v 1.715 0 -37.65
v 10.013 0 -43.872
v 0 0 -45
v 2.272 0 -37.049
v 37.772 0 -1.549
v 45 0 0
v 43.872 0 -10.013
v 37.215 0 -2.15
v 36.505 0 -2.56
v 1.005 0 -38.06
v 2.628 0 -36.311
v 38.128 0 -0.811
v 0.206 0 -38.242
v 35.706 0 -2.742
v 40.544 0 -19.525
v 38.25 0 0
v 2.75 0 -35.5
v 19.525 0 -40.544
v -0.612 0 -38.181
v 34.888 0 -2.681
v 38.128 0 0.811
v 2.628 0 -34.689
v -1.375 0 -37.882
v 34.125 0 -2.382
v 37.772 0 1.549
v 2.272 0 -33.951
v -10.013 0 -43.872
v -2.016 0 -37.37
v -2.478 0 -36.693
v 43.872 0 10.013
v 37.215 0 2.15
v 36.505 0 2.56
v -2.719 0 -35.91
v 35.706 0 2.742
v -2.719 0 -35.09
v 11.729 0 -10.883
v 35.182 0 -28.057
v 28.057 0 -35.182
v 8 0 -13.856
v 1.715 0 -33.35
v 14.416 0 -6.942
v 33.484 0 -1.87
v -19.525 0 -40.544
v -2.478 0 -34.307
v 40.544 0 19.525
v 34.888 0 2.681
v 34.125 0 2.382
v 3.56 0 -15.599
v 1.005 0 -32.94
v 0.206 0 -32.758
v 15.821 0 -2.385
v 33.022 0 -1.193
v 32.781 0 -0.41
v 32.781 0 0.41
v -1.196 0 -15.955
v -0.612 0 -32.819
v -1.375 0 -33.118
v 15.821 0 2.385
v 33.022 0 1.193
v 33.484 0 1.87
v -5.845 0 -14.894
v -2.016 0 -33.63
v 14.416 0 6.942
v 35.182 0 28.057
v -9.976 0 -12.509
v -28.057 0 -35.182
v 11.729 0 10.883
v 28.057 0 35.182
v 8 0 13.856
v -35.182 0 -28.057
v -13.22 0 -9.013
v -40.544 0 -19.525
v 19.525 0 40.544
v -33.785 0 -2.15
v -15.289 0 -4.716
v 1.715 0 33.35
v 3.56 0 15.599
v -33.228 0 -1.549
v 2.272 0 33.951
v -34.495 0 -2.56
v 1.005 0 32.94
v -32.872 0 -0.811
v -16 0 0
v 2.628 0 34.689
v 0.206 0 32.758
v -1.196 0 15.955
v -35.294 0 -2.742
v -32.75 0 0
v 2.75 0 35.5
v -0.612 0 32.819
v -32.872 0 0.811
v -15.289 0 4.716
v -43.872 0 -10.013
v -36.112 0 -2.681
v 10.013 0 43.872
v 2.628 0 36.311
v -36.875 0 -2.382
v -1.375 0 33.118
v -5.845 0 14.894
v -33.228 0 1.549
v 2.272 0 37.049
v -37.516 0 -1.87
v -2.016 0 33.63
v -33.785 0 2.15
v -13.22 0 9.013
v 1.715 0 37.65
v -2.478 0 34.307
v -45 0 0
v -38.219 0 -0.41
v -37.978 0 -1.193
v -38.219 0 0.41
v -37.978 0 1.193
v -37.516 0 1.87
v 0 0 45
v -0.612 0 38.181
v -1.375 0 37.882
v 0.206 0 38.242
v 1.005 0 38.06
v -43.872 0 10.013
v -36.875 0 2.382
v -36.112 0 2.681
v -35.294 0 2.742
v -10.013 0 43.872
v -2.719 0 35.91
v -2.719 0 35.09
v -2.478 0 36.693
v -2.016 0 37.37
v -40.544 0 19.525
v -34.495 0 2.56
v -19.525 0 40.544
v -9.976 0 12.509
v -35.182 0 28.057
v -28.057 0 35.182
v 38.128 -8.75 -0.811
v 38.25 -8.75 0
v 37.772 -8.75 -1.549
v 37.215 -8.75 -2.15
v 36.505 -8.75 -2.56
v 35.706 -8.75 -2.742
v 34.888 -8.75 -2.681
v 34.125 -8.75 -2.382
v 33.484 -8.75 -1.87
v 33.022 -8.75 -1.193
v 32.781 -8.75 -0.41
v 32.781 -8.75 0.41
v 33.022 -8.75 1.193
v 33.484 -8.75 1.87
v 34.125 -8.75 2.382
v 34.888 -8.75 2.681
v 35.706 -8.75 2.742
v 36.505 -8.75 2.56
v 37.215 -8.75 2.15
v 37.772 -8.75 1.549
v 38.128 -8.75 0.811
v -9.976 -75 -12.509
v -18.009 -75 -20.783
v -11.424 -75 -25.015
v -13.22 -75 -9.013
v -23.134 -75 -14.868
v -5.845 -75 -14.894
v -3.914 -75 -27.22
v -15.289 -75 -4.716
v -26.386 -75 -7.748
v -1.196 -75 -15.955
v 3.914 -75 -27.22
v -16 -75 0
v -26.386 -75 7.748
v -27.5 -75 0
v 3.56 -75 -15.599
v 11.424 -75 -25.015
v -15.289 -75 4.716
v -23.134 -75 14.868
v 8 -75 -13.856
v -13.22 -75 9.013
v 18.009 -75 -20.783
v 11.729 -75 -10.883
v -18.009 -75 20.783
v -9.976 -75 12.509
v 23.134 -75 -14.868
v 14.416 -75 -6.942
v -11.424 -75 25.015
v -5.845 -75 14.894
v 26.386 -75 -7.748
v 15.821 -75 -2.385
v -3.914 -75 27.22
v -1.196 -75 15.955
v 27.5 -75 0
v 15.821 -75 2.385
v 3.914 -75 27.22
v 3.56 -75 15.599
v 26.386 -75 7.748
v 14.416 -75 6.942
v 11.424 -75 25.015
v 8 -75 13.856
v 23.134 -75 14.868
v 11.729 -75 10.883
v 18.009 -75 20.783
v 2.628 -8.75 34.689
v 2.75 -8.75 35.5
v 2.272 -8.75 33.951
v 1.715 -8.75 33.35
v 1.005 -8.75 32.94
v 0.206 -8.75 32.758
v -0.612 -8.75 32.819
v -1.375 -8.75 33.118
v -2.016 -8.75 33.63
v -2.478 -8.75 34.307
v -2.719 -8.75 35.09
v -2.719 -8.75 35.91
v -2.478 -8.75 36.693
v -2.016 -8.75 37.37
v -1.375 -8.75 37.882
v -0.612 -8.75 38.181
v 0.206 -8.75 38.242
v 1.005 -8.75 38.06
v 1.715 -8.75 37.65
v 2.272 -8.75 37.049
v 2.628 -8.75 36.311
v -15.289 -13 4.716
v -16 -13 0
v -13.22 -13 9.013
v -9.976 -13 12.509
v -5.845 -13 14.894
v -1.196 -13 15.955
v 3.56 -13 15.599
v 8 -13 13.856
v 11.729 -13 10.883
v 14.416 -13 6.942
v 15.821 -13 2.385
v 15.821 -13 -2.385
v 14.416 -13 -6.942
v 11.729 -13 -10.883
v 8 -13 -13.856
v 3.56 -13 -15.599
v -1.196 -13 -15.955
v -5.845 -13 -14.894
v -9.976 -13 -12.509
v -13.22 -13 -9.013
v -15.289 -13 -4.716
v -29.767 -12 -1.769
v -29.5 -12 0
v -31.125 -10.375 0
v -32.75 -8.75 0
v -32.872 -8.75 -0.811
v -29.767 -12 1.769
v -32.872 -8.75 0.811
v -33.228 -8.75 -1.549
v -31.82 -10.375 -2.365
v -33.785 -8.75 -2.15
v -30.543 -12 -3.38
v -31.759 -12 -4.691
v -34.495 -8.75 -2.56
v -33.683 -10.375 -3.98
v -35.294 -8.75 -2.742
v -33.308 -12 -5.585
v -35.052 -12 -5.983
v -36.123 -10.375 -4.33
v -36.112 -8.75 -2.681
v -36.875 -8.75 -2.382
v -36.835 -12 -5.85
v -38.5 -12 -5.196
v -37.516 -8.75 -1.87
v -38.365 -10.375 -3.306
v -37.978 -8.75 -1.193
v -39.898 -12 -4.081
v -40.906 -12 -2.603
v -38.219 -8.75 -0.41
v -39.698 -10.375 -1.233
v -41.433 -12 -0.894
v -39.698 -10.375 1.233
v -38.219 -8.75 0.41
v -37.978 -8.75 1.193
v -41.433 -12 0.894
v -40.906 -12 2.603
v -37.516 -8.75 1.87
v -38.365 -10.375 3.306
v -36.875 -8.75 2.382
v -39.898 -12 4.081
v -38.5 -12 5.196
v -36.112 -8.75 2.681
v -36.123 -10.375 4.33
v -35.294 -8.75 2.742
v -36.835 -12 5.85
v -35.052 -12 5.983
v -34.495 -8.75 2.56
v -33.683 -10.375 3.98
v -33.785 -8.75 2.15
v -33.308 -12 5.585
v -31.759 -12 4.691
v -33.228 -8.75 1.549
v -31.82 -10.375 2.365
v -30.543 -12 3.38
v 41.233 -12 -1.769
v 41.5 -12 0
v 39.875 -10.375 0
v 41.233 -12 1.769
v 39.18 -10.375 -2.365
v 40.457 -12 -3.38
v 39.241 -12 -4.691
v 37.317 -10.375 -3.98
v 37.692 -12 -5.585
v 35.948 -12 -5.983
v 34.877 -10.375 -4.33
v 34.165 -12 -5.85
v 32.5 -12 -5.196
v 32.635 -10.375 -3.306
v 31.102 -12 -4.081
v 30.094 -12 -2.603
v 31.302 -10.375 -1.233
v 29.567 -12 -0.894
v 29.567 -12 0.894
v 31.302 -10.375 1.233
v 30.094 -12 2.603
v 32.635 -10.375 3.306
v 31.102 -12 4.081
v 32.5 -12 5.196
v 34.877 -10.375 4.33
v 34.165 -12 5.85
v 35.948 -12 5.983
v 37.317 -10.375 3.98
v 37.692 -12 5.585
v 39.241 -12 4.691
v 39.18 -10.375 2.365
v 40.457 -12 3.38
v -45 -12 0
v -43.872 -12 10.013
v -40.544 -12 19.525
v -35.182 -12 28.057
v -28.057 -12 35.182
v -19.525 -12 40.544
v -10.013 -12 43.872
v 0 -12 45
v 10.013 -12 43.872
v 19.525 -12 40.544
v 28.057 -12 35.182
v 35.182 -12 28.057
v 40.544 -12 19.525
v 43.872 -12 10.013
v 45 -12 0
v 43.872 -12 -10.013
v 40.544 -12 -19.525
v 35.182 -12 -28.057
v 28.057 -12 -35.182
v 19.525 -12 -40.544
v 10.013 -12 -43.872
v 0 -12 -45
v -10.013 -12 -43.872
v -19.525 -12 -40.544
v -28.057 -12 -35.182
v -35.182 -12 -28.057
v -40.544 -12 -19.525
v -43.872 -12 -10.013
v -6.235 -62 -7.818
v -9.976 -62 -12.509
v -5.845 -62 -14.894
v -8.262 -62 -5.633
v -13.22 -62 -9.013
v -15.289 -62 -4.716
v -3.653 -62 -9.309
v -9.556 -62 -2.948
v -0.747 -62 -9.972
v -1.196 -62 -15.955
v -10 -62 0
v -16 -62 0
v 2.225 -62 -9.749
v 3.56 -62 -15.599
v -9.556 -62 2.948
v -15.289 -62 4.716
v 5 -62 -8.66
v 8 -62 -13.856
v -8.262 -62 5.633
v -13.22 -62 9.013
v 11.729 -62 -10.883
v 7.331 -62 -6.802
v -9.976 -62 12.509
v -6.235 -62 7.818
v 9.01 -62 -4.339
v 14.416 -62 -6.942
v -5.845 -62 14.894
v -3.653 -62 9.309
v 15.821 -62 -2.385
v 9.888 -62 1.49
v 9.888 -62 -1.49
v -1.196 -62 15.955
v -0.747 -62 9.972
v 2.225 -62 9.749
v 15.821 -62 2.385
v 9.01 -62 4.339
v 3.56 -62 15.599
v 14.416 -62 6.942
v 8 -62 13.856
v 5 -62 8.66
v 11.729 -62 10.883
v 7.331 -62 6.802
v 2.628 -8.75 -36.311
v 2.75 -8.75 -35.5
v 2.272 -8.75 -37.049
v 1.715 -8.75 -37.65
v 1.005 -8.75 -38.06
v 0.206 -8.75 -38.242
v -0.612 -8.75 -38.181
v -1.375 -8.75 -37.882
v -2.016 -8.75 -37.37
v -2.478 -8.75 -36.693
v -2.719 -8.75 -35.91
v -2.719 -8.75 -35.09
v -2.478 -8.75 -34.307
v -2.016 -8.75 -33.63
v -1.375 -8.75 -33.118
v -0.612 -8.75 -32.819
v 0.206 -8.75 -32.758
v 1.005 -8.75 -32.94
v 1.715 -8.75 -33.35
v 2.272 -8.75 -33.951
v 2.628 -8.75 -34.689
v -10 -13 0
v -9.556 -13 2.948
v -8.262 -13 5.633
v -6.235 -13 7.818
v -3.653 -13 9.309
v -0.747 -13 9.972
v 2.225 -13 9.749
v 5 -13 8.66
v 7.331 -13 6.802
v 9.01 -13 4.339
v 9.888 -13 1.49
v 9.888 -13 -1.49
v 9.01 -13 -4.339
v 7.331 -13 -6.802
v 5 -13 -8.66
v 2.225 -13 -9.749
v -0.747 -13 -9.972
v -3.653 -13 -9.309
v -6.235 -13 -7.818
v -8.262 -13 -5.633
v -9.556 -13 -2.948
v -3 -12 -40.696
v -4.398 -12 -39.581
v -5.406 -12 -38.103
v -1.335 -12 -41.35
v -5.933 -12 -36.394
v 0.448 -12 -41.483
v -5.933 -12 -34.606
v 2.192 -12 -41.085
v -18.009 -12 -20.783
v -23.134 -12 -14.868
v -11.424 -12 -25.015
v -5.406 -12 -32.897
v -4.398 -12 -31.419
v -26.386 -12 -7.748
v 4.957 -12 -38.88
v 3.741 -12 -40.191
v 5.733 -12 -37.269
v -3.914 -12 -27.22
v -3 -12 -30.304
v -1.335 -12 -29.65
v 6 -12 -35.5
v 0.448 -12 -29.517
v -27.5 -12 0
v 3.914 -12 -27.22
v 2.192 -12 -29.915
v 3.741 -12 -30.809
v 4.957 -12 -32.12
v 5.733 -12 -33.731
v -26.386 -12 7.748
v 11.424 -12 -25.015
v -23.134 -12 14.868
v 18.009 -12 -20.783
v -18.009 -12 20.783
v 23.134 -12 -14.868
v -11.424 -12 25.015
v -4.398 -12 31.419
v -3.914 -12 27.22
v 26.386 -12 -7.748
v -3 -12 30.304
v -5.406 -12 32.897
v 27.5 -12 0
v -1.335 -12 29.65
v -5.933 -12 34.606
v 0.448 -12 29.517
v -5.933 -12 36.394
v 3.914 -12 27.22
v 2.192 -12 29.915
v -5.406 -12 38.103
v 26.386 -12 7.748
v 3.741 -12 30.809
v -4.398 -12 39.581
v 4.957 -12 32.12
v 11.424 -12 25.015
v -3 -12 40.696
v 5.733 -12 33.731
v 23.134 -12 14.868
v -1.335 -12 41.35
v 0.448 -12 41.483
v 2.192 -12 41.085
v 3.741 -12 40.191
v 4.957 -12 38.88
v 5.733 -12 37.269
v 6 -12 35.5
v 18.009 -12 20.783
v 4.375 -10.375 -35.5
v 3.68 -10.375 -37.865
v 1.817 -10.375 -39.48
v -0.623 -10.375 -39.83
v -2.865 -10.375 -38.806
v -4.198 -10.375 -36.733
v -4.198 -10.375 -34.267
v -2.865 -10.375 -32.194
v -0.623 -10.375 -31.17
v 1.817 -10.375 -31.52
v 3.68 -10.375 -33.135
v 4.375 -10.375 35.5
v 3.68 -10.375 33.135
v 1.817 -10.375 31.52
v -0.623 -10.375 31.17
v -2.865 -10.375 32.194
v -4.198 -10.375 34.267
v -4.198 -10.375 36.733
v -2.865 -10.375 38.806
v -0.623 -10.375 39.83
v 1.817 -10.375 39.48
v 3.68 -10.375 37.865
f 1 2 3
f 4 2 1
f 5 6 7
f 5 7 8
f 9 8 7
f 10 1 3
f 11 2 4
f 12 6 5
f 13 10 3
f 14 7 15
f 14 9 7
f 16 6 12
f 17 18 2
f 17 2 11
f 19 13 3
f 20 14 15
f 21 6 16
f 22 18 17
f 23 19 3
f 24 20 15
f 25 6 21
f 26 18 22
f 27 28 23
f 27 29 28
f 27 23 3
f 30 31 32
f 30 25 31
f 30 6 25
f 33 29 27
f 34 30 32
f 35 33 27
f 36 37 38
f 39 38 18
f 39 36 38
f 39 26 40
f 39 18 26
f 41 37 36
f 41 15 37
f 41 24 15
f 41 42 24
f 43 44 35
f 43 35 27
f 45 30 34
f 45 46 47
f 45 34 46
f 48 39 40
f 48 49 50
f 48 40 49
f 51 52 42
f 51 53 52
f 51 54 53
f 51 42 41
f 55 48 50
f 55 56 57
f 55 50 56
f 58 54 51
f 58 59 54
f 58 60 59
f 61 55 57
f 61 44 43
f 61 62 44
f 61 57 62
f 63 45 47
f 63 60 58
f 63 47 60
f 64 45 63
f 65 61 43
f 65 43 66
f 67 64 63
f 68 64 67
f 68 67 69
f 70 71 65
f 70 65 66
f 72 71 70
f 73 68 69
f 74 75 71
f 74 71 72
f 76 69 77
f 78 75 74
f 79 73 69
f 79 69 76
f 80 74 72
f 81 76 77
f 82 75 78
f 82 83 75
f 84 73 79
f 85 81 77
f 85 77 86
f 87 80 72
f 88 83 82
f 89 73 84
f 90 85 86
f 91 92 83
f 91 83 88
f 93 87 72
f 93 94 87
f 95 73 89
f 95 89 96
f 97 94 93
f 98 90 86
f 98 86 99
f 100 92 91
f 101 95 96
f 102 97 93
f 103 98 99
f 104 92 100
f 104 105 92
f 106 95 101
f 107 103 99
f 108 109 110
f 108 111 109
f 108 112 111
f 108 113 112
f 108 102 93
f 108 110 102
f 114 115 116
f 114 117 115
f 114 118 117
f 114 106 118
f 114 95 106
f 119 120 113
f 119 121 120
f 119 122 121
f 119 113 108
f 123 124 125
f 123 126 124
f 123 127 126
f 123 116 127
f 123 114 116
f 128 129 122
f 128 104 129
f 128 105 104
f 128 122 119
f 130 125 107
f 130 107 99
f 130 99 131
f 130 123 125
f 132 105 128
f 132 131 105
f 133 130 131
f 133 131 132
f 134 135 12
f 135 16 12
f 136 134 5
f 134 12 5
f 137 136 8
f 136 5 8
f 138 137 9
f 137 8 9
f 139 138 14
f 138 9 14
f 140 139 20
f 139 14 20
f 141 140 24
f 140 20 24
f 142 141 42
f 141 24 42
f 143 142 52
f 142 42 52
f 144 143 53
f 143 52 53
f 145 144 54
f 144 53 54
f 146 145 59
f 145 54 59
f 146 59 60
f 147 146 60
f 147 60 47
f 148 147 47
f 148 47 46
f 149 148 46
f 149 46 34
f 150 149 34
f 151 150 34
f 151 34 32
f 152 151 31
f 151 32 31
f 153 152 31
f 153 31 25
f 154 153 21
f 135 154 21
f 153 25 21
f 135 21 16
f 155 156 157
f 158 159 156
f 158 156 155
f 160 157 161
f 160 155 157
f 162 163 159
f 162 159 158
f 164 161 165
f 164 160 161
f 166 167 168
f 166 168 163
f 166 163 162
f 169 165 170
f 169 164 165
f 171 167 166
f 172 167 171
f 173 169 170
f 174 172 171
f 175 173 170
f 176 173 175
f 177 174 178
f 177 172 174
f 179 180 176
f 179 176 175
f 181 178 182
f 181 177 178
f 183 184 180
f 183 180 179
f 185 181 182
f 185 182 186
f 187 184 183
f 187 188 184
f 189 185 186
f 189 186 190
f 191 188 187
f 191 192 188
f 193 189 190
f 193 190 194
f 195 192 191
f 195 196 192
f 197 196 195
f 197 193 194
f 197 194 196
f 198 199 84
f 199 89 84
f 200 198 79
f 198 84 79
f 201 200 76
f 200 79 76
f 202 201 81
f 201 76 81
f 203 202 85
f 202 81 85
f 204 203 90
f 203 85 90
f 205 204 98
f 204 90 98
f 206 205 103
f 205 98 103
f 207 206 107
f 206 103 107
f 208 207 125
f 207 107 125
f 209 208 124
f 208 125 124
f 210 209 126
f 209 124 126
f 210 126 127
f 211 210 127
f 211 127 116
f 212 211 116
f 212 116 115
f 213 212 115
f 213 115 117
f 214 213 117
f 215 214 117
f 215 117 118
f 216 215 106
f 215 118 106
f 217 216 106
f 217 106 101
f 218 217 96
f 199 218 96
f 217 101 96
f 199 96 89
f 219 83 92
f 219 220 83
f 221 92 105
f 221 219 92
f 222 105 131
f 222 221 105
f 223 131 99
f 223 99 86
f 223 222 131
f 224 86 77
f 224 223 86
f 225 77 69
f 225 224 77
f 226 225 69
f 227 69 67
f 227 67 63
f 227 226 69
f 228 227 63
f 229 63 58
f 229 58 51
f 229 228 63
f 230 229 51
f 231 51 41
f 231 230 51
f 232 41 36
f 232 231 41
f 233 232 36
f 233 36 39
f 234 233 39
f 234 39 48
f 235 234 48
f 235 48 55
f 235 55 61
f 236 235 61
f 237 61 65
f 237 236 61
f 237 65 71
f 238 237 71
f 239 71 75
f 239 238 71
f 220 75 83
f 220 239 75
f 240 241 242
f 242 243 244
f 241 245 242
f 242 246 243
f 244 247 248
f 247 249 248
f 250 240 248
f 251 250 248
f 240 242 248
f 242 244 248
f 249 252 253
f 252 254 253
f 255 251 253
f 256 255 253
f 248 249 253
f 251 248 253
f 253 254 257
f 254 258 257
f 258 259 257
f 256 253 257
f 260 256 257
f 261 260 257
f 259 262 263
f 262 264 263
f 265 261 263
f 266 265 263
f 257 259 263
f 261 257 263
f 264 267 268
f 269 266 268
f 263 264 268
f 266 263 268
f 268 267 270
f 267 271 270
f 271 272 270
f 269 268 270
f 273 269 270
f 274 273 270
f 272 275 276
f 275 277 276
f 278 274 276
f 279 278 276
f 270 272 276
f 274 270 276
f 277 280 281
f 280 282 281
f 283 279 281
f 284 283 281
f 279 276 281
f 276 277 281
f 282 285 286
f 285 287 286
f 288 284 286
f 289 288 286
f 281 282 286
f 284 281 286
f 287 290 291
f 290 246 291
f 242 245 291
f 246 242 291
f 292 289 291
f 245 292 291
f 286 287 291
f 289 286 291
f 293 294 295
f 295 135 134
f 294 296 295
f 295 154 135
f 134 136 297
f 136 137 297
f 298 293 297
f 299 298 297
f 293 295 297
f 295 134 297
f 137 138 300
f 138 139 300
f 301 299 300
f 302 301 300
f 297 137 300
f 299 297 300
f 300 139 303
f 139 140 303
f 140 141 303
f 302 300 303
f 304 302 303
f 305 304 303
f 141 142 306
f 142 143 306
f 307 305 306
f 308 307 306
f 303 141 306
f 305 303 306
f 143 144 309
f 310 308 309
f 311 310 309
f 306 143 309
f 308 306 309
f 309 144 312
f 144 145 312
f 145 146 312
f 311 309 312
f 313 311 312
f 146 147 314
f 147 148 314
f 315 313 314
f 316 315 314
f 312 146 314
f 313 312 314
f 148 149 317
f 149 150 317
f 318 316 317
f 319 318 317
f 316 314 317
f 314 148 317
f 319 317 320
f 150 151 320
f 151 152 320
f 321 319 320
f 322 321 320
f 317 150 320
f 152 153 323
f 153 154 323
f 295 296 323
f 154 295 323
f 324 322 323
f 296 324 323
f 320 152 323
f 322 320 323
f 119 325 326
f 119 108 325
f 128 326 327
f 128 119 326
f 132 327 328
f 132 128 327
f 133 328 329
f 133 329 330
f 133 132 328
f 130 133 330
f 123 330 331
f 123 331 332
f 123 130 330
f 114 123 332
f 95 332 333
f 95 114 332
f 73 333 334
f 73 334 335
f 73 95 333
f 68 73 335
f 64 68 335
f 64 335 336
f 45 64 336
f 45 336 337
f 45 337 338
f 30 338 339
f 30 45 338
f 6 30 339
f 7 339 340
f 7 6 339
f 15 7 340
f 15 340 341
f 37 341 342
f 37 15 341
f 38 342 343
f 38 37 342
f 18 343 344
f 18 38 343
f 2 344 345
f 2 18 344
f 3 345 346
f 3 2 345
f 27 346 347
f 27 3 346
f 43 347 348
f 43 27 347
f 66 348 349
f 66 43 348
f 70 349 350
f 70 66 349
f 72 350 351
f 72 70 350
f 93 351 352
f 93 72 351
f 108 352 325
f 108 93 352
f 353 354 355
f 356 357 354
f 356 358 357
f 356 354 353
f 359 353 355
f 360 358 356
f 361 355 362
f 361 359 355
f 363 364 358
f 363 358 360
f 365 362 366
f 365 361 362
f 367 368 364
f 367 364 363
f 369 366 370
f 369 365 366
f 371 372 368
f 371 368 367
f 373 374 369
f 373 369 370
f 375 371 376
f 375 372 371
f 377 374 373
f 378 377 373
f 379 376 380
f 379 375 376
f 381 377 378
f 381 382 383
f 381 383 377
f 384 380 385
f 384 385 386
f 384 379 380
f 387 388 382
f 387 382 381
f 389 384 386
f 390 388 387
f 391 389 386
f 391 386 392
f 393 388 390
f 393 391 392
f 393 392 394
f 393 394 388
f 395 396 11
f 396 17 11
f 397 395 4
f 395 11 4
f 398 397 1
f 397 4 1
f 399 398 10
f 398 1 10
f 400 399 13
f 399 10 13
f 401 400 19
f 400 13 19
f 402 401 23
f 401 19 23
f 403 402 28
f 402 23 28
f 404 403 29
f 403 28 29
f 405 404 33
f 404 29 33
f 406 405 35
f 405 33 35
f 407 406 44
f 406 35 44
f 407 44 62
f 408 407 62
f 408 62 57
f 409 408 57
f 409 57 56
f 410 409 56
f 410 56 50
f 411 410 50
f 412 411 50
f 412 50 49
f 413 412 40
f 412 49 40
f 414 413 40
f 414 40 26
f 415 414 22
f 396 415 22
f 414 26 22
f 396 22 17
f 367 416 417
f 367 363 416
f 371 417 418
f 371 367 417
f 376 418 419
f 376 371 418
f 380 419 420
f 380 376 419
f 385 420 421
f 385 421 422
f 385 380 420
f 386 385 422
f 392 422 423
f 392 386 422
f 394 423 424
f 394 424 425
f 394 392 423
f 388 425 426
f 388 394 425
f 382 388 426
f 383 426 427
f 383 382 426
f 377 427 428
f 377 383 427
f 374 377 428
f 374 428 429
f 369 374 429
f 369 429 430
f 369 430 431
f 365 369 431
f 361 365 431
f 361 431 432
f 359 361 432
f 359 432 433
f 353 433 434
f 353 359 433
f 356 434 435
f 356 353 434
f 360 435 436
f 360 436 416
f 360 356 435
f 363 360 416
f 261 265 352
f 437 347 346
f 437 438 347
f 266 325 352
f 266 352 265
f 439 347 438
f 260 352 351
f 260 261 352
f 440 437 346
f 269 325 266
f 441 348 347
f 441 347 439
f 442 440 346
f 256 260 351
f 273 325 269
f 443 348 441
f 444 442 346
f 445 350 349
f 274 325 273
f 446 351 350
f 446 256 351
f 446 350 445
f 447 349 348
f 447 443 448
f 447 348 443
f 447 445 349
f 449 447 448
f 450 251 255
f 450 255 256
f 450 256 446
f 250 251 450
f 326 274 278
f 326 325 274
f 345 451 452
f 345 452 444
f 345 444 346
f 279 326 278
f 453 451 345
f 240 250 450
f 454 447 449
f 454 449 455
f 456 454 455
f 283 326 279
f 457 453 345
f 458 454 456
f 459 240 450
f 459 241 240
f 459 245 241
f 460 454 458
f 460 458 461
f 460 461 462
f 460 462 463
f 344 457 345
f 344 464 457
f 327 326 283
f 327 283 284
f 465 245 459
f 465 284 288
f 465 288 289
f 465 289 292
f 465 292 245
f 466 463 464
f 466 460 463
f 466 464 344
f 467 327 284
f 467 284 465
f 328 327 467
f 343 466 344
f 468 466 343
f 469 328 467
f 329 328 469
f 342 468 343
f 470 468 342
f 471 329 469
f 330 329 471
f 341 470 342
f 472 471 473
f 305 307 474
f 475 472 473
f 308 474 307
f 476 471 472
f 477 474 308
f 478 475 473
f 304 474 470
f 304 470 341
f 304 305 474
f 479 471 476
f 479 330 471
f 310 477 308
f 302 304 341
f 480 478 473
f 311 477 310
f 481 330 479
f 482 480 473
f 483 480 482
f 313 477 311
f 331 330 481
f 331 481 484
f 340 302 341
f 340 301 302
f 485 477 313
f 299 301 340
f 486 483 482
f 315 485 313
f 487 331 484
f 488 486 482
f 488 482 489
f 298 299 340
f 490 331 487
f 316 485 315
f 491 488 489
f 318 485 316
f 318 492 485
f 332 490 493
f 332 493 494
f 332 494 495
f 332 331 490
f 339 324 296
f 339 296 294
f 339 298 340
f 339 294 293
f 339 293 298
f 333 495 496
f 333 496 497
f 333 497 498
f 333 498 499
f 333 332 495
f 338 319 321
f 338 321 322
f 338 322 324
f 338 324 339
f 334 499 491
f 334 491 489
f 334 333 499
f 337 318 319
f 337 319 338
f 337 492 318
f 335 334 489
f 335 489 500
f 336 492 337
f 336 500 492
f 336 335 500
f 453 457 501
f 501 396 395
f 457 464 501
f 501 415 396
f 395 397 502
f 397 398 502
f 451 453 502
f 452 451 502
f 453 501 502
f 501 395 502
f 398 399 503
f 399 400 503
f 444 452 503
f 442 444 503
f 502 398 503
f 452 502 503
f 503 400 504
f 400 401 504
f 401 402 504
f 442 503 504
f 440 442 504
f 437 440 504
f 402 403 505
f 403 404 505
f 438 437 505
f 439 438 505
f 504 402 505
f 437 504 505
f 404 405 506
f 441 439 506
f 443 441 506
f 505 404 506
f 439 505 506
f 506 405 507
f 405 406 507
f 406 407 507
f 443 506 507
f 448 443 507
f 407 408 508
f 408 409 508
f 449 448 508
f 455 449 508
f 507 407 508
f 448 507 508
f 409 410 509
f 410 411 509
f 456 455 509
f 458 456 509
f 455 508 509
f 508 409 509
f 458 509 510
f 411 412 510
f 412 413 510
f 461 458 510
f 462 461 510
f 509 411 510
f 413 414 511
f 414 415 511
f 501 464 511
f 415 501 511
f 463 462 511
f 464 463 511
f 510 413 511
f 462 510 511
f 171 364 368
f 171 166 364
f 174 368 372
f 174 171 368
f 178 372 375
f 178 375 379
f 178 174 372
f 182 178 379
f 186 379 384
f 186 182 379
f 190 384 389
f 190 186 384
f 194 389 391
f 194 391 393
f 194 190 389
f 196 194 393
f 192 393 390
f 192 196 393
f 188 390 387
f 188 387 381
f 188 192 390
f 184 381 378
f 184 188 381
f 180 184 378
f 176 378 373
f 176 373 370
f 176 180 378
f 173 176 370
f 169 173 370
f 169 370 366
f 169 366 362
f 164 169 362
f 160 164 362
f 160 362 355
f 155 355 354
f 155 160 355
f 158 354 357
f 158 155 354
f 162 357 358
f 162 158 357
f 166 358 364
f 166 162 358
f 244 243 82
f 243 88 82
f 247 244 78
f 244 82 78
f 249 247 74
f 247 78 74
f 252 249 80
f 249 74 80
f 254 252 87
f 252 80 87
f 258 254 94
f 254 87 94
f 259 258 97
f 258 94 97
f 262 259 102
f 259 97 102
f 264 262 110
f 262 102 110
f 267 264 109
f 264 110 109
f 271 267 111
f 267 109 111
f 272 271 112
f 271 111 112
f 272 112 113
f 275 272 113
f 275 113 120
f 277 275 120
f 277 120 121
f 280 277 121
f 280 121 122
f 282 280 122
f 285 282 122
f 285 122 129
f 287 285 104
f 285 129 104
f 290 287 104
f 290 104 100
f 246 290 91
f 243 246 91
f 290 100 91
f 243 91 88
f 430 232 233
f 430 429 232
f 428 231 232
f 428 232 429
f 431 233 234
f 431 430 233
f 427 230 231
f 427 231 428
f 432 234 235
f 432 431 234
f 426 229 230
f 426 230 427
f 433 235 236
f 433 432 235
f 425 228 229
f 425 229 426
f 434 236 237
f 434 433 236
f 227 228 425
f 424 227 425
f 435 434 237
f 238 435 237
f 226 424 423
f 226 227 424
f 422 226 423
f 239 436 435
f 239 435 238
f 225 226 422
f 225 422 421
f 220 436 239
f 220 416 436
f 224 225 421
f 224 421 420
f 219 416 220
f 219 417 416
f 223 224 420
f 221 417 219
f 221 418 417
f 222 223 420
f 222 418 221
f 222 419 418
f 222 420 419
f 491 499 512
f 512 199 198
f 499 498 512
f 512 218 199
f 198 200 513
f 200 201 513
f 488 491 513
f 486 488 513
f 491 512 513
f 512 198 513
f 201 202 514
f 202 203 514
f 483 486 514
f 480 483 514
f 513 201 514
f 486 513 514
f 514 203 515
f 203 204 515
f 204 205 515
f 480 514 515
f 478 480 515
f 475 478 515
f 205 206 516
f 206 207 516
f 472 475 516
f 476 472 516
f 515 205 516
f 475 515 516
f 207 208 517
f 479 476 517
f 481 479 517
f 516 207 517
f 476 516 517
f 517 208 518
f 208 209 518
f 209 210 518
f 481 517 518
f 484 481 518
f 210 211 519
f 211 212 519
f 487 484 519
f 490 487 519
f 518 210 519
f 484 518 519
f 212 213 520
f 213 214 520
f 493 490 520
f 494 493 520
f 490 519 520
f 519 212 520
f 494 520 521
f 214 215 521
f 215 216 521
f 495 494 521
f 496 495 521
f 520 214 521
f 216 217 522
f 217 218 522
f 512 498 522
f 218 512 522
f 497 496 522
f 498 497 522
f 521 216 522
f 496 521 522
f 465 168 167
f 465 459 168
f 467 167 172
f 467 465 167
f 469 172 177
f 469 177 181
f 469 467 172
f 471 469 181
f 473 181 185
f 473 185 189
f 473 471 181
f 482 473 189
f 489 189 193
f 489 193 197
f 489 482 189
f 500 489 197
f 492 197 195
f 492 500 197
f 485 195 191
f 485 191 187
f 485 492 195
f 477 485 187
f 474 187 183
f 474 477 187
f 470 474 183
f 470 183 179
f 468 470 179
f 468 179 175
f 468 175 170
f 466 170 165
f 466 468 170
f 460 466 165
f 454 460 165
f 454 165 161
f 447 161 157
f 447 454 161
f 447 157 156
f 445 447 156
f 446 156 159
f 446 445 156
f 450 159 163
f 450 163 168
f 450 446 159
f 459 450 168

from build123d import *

# Parameters (mm, degrees)
M5_CLEARANCE_HOLE1_D           = 5.5
M5_CLEARANCE_HOLE1_CSINK_D     = 12
M5_CLEARANCE_HOLE1_CSINK_ANGLE = 90


with BuildPart() as part:
    # Sketch1 → Revolve1 (revolve)
    with BuildSketch(Plane.XY):
        Polygon((-45, 0), (-16, 0), (-16, -13), (-10, -13), (-10, -62), (-16, -62), (-16, -75), (-27.5, -75), (-27.5, -12), (-45, -12), align=None)
    revolve(axis=Axis((0, 0, 0), (0, 1, 0)))

    # M5 Clearance Hole1 (through all)
    with Locations(Plane(origin=(0, -12, 0), x_dir=(-1, 0, 0), z_dir=(0, -1, 0))):
        with Locations((-35.5, 0), (0, -35.5), (35.5, 0), (0, 35.5)):
            CounterSinkHole(M5_CLEARANCE_HOLE1_D / 2, M5_CLEARANCE_HOLE1_CSINK_D / 2, counter_sink_angle=M5_CLEARANCE_HOLE1_CSINK_ANGLE)


solid = part.part
